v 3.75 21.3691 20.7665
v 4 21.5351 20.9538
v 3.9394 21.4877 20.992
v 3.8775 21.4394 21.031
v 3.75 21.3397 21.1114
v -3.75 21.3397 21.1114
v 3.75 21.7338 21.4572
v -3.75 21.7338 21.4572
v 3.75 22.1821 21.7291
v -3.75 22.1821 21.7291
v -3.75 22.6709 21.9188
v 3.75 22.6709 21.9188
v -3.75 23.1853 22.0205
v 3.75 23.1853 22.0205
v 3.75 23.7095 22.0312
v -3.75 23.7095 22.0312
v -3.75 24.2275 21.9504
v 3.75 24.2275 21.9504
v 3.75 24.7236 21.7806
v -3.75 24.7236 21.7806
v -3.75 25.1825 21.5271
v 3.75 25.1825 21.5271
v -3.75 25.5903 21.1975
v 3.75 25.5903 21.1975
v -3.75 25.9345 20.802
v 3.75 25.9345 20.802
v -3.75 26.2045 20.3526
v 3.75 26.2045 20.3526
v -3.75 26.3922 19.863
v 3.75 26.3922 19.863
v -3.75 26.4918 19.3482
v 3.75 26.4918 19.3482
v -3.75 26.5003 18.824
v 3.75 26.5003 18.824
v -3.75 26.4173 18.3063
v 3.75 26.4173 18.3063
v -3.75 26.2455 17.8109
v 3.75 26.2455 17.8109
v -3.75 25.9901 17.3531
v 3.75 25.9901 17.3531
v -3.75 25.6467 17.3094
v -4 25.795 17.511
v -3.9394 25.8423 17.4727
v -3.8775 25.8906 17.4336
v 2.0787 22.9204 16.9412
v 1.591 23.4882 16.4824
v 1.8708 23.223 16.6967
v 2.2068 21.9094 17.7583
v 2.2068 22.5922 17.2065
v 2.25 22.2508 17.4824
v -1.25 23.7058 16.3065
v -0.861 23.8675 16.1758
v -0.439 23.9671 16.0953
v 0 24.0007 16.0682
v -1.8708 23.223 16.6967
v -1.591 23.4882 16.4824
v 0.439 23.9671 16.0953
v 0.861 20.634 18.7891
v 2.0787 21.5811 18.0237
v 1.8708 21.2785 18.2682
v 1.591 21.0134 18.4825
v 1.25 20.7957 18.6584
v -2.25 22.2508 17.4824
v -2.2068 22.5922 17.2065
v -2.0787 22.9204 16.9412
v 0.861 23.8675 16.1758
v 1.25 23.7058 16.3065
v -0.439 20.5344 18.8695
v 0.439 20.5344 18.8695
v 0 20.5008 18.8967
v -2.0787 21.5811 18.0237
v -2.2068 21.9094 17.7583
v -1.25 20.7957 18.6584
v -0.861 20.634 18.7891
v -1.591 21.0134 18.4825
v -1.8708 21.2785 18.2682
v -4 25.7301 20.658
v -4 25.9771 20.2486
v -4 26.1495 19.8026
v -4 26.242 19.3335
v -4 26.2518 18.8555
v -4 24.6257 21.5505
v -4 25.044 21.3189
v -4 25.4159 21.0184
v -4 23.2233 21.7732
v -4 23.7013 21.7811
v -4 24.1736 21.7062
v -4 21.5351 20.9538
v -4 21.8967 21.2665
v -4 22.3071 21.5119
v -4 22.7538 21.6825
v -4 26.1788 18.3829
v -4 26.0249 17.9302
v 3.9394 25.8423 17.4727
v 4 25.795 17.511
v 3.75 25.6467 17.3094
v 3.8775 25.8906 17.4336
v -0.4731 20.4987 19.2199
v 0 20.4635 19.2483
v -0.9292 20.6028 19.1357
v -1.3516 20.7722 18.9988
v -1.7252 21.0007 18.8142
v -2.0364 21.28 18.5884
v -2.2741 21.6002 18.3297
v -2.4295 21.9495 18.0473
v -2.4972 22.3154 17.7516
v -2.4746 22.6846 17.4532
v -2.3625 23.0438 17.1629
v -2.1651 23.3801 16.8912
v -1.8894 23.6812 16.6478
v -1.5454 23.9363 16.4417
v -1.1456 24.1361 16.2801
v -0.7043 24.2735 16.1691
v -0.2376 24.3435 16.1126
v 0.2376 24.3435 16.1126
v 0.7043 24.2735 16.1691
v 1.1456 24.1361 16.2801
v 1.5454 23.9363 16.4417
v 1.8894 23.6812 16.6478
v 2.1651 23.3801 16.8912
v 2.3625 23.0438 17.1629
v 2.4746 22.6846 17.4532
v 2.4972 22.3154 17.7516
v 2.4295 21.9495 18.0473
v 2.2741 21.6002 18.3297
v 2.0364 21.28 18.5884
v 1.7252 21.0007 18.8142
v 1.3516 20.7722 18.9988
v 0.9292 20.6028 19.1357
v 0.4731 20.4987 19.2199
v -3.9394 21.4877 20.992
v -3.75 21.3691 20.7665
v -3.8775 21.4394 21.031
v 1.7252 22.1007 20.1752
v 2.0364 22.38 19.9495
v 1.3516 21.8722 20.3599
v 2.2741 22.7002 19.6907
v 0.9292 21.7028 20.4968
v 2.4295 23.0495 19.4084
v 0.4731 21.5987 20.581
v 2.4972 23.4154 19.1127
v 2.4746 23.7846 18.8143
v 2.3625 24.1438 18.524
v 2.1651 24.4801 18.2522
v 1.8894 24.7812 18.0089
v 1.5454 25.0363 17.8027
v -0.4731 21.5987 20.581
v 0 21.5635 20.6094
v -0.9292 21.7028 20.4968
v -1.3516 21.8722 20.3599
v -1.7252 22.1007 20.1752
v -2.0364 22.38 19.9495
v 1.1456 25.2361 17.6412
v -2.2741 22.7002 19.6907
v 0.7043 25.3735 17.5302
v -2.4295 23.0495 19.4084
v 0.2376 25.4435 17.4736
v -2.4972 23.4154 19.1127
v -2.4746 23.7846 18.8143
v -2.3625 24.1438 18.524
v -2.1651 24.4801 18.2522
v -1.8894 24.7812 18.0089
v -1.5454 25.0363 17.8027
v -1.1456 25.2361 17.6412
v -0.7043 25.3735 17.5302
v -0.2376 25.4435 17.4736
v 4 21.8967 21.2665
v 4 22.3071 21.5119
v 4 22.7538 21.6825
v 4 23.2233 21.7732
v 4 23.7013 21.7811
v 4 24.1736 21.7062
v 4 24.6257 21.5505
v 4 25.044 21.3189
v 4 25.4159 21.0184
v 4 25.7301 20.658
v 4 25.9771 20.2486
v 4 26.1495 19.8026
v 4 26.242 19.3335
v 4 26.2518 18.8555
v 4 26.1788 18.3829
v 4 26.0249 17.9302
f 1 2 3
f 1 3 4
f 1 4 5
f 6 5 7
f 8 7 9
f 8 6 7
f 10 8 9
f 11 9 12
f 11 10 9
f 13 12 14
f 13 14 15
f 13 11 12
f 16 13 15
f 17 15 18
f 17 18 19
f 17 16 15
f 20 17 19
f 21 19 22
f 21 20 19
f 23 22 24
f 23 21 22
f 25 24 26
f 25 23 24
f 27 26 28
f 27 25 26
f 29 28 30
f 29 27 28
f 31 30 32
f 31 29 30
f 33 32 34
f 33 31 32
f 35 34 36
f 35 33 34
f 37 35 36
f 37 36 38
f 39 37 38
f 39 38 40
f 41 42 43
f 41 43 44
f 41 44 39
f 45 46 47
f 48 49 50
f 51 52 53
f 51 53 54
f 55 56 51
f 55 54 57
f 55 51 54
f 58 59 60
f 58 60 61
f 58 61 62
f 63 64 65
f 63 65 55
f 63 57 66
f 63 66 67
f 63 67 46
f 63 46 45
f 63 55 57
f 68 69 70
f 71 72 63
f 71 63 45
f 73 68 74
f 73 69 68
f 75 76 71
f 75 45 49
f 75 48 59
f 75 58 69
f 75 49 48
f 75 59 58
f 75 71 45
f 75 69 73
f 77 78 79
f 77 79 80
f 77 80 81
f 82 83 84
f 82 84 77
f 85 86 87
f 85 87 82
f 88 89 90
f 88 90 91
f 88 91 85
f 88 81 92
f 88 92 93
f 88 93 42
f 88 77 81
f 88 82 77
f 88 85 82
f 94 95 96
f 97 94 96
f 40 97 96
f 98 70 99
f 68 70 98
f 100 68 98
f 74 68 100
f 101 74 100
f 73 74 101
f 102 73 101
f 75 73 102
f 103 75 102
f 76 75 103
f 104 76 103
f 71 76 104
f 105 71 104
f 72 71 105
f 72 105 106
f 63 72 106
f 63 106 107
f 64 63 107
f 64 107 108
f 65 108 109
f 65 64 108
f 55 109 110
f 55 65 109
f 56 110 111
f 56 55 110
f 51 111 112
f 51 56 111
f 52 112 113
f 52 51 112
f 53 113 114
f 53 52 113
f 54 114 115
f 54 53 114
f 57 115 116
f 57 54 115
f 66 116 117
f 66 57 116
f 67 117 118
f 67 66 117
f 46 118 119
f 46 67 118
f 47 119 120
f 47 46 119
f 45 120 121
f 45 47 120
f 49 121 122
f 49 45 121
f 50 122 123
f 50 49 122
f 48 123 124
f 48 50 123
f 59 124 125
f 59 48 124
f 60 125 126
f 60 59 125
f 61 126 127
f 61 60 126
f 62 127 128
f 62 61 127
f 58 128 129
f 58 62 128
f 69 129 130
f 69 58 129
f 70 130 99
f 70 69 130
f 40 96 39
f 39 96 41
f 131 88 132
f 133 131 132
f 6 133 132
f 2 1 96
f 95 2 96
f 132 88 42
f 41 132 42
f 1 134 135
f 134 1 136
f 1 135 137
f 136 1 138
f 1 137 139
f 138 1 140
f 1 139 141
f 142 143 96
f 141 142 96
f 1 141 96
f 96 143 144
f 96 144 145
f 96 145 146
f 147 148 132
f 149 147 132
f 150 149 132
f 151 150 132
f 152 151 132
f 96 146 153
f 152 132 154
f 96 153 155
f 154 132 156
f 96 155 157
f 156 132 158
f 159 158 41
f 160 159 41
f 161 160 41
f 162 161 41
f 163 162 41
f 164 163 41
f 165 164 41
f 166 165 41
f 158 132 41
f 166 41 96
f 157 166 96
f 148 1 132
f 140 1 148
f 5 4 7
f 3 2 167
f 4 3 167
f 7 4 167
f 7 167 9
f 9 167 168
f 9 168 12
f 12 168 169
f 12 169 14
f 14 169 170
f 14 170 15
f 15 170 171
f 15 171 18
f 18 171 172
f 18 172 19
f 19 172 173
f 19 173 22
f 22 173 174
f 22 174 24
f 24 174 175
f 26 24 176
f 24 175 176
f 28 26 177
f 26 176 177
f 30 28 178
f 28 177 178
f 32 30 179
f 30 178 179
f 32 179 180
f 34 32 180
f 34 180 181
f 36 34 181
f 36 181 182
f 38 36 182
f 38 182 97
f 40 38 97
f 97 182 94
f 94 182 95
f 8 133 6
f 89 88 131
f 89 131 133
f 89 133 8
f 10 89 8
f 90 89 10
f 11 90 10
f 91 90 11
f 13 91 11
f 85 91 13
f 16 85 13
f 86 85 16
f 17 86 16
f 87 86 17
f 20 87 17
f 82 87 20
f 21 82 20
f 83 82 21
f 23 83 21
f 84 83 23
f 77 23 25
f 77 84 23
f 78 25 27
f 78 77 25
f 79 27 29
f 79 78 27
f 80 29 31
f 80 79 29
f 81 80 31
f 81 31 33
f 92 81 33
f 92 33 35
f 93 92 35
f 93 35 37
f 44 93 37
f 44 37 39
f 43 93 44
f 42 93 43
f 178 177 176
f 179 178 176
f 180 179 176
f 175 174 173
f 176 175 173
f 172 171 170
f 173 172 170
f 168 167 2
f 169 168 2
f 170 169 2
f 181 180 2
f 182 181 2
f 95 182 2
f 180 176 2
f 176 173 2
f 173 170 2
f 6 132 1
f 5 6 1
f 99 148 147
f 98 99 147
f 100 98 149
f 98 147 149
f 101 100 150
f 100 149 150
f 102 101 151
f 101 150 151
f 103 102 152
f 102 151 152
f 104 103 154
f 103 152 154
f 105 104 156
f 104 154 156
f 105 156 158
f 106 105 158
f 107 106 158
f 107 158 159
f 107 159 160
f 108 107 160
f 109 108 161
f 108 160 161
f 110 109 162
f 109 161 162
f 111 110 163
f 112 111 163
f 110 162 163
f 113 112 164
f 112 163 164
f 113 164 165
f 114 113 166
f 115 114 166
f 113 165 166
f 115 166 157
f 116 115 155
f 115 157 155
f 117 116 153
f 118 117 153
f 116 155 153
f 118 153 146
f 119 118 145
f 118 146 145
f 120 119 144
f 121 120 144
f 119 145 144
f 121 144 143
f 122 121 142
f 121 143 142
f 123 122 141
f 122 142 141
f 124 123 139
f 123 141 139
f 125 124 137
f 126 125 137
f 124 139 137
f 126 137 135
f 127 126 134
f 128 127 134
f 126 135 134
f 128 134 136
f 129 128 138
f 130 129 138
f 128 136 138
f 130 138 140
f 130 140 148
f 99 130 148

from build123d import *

# Parameters (mm, degrees)
PAD005_DEPTH            = 4
SKETCH014_R             = 2.5
PAD006_DEPTH            = 2
CHAMFER_SIZE            = 0.25
BODY005_ROLL_ANGLE      = -51.0553562624
BODY005_PLACEMENT_ANGLE = 180


with BuildPart() as part:
    # Sketch013 → Pad005 (new body, symmetric)
    with BuildSketch(Plane.YZ):
        with BuildLine():
            ThreePointArc((0, 3), (-3, 0), (0, -3))
            Line((0, 3), (0, -3))
        make_face()
    extrude(amount=PAD005_DEPTH, both=True)

    # Sketch014 (on Face2 of Pad005) → Pad006 (join)
    with BuildSketch(Plane.ZX):
        Circle(SKETCH014_R)
    extrude(amount=PAD006_DEPTH)

    # Chamfer
    chamfer_edges = [part.edges().sort_by_distance(p)[0] for p in [
        (0, 2, -2.5),
        (-4, -3, 0),
        (-4, 0, 0),
        (4, -3, 0),
        (4, 0, 0),
        (0, 0, -3),
        (0, 0, 3),
    ]]
    chamfer(chamfer_edges, length=CHAMFER_SIZE)


with BuildPart() as part_1:
    # Body005 roll: moved
    add(part.part.rotate(Axis((0, 0, 0), (1, 0, 0)), BODY005_ROLL_ANGLE))


with BuildPart() as part_2:
    # Body005 placement: moved
    add(part_1.part.moved(Location((0, 23.5078988941, 19.0379414122))).rotate(Axis((0, 23.5078988941, 19.0379414122), (0, 0, 1)), BODY005_PLACEMENT_ANGLE))


solid = part_2.part
